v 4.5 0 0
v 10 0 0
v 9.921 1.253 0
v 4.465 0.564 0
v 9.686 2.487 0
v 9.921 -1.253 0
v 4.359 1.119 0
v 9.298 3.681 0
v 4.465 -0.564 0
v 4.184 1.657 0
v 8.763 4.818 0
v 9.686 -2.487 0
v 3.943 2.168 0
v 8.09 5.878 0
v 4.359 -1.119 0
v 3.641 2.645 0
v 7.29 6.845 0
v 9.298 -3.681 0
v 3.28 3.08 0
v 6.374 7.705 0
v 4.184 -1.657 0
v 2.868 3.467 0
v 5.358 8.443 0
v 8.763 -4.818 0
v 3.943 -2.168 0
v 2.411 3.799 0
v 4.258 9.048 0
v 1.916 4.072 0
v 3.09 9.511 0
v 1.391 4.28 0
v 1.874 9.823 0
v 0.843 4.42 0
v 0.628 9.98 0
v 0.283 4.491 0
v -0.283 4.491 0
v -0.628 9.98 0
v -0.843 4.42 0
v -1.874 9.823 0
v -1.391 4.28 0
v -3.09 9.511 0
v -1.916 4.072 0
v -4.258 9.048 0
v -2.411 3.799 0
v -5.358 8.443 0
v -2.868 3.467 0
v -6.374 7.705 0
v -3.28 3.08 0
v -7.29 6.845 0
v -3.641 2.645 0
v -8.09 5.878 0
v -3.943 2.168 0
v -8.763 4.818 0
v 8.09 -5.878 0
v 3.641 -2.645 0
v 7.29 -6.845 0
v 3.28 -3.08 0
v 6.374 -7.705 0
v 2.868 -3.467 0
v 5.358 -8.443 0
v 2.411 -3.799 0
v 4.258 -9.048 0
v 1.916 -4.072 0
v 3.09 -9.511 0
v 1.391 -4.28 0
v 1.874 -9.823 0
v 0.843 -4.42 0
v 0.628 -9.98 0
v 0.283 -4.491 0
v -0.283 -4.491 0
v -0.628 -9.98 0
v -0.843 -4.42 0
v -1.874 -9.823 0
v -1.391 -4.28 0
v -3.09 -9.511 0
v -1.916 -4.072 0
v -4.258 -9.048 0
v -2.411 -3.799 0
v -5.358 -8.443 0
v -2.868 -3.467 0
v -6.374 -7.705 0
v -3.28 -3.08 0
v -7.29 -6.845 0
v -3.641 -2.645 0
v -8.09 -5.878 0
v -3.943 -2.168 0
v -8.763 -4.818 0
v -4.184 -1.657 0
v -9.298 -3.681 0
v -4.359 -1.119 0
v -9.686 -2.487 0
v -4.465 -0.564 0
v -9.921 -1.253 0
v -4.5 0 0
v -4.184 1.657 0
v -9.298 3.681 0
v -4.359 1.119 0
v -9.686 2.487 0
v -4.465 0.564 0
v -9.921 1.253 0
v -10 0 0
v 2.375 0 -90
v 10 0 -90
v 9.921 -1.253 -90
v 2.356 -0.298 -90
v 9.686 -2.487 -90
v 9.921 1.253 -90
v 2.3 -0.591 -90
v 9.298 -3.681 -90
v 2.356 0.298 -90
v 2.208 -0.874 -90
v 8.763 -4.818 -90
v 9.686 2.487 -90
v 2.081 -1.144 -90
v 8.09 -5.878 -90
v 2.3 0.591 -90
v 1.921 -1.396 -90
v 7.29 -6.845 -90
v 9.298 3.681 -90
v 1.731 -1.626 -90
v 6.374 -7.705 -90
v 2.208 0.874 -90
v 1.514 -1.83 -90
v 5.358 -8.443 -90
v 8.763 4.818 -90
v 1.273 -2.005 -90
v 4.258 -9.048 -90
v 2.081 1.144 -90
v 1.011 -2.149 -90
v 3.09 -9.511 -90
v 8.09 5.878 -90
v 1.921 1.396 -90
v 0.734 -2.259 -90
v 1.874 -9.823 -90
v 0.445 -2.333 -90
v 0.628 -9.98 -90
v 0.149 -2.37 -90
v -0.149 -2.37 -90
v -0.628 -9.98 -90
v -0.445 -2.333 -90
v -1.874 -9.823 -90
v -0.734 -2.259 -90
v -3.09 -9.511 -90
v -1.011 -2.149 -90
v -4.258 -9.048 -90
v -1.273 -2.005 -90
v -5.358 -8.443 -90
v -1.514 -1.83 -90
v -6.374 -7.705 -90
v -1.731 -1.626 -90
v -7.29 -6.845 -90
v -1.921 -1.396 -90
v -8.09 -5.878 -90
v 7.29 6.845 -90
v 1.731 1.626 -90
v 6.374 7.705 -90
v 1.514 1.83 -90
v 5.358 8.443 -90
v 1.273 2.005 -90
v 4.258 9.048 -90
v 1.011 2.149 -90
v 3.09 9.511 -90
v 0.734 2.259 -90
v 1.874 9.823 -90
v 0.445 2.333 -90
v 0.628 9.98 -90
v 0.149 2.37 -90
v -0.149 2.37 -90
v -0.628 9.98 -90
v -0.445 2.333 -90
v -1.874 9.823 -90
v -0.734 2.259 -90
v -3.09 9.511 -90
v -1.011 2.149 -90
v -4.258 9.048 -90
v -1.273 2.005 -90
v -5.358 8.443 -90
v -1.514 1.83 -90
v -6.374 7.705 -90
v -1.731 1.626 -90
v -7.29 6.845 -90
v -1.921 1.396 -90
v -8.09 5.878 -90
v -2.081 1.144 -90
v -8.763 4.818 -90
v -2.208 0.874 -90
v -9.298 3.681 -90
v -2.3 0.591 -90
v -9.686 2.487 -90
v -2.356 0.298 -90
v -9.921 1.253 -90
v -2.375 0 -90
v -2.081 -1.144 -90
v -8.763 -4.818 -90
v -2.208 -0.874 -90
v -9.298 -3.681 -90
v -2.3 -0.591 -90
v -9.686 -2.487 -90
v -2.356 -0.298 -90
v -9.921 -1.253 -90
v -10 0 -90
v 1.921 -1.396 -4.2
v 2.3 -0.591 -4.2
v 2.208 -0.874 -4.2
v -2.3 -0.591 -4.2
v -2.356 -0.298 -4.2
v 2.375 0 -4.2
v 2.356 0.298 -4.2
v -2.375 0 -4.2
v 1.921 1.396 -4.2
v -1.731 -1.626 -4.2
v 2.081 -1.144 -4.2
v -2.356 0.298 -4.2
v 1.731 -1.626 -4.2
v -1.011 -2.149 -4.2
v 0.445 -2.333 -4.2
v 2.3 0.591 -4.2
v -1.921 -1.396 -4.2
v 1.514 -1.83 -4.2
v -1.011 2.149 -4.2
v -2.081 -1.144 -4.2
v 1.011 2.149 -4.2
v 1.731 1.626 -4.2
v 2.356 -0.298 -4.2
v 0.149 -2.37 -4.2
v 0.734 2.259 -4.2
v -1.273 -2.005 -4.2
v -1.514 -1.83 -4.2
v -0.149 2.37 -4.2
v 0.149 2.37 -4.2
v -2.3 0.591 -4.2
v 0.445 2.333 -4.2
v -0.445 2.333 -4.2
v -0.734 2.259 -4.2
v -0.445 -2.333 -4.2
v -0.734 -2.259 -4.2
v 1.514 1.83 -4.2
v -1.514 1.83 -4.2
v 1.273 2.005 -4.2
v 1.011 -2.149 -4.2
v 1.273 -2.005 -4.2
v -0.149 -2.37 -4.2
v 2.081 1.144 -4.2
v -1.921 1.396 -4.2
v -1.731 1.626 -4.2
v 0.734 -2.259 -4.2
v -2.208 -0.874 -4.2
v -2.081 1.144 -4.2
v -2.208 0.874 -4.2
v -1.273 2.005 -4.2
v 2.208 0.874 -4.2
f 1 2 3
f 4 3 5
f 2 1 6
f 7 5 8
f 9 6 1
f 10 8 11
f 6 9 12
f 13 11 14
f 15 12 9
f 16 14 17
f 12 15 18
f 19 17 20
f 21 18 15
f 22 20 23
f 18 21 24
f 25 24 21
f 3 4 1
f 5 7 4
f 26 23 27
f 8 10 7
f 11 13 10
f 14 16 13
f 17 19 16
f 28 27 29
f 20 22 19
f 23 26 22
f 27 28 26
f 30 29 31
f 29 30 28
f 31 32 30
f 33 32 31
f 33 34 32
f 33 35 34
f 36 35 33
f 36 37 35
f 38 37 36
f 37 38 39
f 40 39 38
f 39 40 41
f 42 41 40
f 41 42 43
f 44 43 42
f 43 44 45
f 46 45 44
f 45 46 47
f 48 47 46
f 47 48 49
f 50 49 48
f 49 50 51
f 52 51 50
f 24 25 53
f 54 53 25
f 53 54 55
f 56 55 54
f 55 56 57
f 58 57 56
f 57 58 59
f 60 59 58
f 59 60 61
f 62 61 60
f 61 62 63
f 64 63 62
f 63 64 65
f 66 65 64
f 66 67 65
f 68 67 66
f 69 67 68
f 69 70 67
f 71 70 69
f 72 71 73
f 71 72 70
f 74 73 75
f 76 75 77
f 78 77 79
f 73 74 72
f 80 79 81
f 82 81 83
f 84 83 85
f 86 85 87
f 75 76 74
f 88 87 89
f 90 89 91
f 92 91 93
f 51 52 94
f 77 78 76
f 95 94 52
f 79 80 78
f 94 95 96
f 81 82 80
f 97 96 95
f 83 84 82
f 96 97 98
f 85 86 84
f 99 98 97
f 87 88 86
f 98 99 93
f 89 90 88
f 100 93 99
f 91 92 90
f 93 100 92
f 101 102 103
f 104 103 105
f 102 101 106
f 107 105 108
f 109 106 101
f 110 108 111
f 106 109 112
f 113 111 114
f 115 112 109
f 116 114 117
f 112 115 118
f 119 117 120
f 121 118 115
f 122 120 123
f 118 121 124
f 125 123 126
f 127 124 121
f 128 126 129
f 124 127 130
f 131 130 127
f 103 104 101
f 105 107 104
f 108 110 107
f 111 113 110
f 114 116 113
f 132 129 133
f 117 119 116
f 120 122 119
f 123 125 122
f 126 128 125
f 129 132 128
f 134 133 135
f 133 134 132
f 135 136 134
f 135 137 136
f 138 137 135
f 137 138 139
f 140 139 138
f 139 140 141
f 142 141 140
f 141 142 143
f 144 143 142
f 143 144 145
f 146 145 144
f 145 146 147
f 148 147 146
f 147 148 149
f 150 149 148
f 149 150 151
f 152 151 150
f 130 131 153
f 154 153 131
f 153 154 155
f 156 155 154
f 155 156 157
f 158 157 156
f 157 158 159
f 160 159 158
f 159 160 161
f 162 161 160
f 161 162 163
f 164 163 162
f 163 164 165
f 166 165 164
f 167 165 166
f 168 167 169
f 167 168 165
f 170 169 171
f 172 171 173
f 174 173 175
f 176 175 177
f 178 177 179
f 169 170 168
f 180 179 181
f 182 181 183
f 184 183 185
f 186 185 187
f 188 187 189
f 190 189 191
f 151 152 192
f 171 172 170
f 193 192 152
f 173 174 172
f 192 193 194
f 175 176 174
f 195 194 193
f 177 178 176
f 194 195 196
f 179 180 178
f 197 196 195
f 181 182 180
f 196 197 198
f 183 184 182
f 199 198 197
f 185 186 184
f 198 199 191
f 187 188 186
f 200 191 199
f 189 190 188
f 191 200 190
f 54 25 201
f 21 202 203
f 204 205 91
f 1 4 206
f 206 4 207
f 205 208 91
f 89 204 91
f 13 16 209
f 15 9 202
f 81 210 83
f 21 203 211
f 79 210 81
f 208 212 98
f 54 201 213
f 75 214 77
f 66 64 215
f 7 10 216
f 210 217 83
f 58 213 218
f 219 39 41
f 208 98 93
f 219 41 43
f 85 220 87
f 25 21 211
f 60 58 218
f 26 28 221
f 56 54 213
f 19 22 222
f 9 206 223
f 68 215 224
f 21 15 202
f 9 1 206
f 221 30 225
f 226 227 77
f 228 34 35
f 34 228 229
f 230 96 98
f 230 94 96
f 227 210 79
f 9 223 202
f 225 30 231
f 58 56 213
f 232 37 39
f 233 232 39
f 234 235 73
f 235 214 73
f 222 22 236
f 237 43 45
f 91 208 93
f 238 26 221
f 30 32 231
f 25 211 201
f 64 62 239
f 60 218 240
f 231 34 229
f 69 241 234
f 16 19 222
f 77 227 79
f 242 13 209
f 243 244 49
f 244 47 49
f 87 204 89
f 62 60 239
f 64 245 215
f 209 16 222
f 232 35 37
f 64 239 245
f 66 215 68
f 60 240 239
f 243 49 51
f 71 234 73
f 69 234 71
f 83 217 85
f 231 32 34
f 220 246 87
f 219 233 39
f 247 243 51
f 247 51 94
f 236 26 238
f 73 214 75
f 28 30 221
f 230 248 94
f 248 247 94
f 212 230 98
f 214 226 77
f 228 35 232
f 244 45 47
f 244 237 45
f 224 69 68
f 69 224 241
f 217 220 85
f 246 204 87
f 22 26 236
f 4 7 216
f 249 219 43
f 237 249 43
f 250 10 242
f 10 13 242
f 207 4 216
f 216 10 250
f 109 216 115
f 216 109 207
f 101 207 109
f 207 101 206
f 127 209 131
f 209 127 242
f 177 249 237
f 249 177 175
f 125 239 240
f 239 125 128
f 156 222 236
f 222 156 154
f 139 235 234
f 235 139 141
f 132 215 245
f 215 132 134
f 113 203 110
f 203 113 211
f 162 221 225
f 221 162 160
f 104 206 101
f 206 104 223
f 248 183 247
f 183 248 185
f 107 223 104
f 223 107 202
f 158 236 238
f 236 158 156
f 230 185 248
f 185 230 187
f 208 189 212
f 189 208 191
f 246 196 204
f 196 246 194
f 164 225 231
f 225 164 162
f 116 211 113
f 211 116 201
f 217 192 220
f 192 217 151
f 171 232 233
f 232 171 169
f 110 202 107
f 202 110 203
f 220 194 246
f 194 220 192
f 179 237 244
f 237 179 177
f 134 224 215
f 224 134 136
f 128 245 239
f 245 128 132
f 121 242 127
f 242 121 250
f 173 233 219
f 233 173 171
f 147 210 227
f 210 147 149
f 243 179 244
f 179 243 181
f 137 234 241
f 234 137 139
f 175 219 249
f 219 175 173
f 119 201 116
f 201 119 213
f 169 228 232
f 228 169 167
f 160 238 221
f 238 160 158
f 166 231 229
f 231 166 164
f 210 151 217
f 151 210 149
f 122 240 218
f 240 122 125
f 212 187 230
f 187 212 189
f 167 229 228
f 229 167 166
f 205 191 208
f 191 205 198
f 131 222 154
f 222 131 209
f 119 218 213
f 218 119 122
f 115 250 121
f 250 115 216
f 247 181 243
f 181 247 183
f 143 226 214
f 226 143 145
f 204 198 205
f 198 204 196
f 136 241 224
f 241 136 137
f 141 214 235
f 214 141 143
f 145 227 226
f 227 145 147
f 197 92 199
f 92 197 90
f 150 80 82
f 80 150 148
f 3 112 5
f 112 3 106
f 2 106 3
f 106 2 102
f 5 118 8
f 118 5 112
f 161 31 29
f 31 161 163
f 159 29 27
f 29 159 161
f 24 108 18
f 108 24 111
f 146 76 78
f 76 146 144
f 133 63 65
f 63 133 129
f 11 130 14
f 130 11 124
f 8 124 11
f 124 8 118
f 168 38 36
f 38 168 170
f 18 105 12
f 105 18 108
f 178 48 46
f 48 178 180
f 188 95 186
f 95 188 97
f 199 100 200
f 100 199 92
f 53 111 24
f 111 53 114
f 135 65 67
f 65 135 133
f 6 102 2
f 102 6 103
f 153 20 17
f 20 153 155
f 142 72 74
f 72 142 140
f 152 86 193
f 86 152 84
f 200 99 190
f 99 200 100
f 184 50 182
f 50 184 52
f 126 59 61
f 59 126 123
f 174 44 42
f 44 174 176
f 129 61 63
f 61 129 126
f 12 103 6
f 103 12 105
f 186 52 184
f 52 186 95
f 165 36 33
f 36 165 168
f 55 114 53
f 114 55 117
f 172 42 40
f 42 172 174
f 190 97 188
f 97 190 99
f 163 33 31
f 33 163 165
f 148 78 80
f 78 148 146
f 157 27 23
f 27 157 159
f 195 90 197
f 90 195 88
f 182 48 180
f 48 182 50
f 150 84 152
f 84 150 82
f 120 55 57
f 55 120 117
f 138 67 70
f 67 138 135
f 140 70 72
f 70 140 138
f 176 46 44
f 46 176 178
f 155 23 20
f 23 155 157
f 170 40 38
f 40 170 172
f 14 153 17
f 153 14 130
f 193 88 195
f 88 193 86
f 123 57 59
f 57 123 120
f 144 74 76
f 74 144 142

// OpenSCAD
$fn = 50;


difference() {
	union() {
		translate(v = [0, 0, -90.0000000000]) {
			cylinder(h = 90, r = 10.0000000000);
		}
	}
	union() {
		translate(v = [0, 0, 0]) {
			rotate(a = [0, 0, 0]) {
				difference() {
					union() {
						#translate(v = [0, 0, -90.0000000000]) {
							cylinder(h = 90, r = 2.2500000000);
						}
						#translate(v = [0, 0, -4.2000000000]) {
							cylinder(h = 4.2000000000, r = 10.0000000000, r1 = 2.3750000000, r2 = 4.5000000000);
						}
						#translate(v = [0, 0, -90.0000000000]) {
							cylinder(h = 90, r = 2.3750000000);
						}
						#translate(v = [0, 0, -90.0000000000]) {
							cylinder(h = 90, r = 2.2500000000);
						}
					}
					union();
				}
			}
		}
	}
}
